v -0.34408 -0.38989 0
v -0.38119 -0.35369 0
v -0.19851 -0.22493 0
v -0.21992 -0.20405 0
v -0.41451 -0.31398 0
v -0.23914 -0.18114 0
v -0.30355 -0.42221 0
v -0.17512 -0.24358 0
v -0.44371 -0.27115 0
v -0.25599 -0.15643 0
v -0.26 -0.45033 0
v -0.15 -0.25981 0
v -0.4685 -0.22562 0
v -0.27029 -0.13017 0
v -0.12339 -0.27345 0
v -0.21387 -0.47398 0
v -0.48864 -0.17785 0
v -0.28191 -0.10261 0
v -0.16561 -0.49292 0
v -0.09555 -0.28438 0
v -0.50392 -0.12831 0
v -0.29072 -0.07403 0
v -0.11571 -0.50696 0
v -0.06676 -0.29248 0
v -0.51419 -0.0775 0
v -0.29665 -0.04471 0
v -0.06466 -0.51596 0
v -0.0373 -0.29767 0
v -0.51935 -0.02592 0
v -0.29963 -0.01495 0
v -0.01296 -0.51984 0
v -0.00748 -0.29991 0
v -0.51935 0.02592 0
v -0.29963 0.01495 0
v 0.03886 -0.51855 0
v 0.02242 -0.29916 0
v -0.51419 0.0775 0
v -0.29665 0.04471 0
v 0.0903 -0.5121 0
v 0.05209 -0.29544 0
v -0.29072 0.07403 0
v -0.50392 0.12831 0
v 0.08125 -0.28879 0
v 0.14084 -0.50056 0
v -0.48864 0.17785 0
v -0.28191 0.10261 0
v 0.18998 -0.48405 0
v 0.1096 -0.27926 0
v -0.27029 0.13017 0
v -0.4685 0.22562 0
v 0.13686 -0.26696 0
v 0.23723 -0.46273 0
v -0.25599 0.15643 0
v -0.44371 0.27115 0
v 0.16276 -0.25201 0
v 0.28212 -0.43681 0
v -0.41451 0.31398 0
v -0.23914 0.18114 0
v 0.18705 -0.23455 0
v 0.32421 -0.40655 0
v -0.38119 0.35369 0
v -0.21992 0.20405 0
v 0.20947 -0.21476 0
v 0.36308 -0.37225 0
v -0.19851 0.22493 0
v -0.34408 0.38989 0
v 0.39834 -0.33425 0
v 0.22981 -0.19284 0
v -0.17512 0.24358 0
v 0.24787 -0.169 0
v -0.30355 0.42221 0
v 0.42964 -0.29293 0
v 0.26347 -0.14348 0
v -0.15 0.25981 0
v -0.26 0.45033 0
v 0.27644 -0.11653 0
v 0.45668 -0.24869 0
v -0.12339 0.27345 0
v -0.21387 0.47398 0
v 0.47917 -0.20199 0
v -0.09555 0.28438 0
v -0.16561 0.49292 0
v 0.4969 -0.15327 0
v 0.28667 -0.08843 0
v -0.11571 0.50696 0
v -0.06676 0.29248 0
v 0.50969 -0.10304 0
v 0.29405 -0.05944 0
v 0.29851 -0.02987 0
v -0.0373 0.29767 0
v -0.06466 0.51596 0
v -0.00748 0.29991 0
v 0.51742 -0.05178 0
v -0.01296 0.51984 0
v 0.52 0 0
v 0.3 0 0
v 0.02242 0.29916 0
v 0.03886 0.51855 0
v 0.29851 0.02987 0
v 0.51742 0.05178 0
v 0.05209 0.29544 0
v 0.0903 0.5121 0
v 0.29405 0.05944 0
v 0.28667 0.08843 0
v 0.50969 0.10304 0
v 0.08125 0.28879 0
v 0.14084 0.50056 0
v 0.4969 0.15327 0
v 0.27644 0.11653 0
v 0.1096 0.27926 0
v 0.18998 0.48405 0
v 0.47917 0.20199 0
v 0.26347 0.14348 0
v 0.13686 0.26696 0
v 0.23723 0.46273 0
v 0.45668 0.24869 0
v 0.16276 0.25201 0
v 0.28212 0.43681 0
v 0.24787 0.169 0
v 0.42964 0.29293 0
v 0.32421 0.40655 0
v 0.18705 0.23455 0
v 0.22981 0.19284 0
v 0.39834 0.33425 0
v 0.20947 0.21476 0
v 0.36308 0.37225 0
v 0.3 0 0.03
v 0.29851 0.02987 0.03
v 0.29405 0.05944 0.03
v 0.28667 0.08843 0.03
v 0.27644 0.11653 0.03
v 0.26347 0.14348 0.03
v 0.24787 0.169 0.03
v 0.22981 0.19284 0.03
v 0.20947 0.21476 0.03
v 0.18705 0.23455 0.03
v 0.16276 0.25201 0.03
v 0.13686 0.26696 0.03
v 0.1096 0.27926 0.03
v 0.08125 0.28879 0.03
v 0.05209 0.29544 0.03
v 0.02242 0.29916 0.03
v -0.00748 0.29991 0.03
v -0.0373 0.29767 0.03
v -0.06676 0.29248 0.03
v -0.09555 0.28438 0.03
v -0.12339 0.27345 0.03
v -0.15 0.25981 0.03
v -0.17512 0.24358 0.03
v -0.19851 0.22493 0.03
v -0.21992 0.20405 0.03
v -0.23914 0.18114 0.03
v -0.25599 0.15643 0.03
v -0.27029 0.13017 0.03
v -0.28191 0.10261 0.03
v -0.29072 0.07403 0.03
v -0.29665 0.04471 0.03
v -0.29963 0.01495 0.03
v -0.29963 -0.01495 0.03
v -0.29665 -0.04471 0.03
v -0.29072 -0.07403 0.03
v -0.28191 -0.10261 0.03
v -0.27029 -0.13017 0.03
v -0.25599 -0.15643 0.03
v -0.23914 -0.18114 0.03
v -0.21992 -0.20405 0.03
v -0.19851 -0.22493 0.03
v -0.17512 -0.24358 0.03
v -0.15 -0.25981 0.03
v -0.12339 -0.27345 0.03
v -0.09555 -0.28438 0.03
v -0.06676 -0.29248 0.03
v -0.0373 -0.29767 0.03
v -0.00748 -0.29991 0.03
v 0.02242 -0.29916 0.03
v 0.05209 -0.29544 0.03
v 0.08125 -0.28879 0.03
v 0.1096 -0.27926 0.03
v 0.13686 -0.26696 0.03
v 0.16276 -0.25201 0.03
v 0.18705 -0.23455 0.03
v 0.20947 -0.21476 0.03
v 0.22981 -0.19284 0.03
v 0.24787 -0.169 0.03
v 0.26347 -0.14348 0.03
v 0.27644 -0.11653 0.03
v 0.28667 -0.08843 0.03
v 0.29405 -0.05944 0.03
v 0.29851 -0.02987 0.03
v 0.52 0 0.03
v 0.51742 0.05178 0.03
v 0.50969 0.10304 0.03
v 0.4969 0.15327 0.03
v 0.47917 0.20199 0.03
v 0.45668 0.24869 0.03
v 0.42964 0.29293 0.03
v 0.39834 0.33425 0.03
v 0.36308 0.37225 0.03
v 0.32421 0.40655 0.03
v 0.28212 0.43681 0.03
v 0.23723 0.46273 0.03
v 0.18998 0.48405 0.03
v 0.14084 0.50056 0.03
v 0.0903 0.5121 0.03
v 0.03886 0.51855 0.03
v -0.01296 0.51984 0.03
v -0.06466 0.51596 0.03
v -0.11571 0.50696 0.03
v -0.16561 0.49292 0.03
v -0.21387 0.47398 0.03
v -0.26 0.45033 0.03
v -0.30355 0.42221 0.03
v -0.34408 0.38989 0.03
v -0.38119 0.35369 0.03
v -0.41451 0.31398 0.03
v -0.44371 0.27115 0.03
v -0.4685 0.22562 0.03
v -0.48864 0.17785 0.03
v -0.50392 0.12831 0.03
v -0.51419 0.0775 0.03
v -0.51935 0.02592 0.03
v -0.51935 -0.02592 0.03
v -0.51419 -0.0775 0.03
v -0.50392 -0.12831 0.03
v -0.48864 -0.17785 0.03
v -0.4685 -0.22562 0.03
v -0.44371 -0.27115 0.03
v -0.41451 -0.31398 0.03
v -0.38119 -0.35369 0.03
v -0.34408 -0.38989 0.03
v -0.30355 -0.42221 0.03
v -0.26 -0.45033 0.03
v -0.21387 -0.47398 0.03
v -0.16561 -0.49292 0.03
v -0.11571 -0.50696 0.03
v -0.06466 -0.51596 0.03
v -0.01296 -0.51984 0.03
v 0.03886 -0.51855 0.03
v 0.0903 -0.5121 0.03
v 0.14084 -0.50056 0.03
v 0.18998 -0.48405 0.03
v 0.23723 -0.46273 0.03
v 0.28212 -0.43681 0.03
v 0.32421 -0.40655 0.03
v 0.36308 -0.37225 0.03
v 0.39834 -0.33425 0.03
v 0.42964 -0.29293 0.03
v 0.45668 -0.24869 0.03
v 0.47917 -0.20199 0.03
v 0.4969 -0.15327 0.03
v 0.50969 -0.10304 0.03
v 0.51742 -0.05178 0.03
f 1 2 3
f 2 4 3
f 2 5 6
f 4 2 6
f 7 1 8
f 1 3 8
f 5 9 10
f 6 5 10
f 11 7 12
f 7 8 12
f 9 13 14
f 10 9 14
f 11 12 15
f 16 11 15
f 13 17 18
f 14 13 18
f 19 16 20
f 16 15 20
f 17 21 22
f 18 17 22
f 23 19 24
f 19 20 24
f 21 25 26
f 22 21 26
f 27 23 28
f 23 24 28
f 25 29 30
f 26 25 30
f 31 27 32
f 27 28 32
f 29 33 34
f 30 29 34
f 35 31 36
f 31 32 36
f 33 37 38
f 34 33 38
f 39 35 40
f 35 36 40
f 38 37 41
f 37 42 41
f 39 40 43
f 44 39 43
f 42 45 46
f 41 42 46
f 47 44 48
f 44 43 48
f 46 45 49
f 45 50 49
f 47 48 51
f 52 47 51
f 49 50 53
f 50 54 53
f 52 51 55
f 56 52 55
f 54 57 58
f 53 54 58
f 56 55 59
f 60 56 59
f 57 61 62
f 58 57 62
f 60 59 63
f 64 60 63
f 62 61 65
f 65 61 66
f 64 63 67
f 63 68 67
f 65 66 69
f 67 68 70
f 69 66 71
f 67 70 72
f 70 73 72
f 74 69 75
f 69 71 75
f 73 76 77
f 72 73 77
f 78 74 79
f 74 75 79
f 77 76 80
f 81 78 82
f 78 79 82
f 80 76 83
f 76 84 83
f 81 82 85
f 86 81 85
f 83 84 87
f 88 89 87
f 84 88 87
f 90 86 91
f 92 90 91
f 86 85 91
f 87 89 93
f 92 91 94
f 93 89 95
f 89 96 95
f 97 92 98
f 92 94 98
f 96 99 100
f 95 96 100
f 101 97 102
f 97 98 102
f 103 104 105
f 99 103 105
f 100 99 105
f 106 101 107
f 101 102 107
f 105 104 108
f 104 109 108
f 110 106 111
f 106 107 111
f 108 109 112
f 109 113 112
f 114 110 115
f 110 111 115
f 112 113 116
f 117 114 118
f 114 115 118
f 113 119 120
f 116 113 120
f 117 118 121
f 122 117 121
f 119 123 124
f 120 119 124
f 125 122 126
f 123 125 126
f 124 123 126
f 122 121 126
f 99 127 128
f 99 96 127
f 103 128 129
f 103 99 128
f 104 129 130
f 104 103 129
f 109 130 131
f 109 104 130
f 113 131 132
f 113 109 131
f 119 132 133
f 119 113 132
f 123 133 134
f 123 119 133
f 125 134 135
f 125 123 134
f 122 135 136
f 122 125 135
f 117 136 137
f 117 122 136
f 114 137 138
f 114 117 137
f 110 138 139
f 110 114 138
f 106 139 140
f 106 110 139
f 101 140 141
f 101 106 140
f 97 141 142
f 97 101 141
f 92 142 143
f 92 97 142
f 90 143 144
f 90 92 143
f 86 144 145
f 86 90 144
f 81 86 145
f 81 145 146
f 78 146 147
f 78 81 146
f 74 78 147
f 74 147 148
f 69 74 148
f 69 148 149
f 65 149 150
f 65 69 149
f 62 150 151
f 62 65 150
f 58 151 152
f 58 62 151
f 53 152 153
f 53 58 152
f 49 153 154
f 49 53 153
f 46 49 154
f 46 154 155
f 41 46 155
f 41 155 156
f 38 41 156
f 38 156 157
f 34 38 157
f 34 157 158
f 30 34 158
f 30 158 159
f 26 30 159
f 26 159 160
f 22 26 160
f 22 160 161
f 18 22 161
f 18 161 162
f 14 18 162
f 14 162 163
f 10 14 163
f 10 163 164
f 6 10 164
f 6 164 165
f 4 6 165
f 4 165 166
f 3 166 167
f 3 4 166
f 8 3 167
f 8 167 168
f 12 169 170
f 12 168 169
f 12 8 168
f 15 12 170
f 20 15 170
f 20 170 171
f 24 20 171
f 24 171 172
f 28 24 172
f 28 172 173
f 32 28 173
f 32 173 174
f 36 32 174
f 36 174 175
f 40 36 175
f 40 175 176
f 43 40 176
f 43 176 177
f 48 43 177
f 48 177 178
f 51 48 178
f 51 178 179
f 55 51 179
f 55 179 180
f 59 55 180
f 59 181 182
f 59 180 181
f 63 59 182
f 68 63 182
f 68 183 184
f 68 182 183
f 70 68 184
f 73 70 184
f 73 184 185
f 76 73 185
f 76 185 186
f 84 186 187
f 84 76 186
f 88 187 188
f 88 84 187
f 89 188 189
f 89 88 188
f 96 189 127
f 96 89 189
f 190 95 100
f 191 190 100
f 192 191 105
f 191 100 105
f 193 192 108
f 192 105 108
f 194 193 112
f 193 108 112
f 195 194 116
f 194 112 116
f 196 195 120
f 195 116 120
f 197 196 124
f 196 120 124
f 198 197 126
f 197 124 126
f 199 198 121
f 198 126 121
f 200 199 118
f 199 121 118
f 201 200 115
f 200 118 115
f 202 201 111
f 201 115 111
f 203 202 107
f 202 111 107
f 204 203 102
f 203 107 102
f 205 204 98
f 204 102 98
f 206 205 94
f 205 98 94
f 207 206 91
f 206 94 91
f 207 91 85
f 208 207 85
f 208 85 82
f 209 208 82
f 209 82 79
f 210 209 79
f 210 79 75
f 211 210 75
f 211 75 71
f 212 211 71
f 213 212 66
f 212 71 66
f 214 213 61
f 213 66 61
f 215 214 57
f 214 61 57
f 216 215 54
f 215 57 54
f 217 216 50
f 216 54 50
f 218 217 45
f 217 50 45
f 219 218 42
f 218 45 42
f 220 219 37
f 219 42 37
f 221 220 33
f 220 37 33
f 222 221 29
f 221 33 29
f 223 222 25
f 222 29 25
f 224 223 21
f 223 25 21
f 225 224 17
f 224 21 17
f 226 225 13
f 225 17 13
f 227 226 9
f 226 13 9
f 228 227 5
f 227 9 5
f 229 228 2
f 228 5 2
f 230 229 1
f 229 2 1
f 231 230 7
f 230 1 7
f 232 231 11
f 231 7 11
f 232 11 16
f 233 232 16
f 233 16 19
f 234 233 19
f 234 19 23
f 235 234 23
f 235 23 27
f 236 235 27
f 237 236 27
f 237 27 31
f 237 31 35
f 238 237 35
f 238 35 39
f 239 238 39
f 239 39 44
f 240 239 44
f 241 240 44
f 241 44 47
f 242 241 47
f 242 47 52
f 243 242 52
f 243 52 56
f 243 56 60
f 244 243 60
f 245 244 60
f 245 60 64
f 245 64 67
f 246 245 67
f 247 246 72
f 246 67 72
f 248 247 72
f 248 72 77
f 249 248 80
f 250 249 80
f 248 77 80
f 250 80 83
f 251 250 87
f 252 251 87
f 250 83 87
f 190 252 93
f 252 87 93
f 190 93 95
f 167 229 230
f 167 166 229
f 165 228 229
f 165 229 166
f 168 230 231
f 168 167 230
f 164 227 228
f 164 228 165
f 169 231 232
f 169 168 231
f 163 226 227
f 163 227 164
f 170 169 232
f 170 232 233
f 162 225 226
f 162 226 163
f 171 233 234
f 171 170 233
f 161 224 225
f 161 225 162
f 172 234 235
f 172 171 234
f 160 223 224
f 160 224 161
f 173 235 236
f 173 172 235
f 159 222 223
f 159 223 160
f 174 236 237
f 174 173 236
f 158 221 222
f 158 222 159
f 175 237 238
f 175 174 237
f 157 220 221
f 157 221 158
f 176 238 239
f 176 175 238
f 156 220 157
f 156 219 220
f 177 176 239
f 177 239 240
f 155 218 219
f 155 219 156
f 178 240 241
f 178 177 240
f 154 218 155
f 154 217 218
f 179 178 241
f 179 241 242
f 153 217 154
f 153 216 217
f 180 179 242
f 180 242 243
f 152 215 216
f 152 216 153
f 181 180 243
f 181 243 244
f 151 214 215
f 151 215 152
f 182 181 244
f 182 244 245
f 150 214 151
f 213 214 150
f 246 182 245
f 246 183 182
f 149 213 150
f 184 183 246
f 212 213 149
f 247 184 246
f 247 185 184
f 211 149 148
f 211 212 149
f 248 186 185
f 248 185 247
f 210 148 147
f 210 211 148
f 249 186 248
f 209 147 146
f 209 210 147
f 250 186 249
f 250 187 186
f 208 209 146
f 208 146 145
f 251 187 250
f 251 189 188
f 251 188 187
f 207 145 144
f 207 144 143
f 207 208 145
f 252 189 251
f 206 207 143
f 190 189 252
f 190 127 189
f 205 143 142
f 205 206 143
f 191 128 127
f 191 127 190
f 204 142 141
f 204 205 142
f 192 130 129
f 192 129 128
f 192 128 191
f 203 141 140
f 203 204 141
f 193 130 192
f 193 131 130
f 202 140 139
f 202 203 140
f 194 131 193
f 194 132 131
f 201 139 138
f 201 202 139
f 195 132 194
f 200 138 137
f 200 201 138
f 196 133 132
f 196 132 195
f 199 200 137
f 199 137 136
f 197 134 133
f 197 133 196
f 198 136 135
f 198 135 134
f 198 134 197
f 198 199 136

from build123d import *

# Parameters (mm, degrees)
CYLINDER001_R     = 0.3
CYLINDER001_DEPTH = 1
CYLINDER_R        = 0.52
CYLINDER_DEPTH    = 0.03


with BuildPart() as cylinder001:
    # Cylinder001 → Cylinder001 (new body)
    with BuildSketch(Plane.XY.offset(-0.5)):
        Circle(CYLINDER001_R)
    extrude(amount=CYLINDER001_DEPTH)


with BuildPart() as tp105p60d:
    # Cylinder → Cylinder (new body)
    with BuildSketch(Plane.XY):
        Circle(CYLINDER_R)
    extrude(amount=CYLINDER_DEPTH)

    # Cut: cut Cylinder001
    add(cylinder001.part, mode=Mode.SUBTRACT)


solid = tp105p60d.part
